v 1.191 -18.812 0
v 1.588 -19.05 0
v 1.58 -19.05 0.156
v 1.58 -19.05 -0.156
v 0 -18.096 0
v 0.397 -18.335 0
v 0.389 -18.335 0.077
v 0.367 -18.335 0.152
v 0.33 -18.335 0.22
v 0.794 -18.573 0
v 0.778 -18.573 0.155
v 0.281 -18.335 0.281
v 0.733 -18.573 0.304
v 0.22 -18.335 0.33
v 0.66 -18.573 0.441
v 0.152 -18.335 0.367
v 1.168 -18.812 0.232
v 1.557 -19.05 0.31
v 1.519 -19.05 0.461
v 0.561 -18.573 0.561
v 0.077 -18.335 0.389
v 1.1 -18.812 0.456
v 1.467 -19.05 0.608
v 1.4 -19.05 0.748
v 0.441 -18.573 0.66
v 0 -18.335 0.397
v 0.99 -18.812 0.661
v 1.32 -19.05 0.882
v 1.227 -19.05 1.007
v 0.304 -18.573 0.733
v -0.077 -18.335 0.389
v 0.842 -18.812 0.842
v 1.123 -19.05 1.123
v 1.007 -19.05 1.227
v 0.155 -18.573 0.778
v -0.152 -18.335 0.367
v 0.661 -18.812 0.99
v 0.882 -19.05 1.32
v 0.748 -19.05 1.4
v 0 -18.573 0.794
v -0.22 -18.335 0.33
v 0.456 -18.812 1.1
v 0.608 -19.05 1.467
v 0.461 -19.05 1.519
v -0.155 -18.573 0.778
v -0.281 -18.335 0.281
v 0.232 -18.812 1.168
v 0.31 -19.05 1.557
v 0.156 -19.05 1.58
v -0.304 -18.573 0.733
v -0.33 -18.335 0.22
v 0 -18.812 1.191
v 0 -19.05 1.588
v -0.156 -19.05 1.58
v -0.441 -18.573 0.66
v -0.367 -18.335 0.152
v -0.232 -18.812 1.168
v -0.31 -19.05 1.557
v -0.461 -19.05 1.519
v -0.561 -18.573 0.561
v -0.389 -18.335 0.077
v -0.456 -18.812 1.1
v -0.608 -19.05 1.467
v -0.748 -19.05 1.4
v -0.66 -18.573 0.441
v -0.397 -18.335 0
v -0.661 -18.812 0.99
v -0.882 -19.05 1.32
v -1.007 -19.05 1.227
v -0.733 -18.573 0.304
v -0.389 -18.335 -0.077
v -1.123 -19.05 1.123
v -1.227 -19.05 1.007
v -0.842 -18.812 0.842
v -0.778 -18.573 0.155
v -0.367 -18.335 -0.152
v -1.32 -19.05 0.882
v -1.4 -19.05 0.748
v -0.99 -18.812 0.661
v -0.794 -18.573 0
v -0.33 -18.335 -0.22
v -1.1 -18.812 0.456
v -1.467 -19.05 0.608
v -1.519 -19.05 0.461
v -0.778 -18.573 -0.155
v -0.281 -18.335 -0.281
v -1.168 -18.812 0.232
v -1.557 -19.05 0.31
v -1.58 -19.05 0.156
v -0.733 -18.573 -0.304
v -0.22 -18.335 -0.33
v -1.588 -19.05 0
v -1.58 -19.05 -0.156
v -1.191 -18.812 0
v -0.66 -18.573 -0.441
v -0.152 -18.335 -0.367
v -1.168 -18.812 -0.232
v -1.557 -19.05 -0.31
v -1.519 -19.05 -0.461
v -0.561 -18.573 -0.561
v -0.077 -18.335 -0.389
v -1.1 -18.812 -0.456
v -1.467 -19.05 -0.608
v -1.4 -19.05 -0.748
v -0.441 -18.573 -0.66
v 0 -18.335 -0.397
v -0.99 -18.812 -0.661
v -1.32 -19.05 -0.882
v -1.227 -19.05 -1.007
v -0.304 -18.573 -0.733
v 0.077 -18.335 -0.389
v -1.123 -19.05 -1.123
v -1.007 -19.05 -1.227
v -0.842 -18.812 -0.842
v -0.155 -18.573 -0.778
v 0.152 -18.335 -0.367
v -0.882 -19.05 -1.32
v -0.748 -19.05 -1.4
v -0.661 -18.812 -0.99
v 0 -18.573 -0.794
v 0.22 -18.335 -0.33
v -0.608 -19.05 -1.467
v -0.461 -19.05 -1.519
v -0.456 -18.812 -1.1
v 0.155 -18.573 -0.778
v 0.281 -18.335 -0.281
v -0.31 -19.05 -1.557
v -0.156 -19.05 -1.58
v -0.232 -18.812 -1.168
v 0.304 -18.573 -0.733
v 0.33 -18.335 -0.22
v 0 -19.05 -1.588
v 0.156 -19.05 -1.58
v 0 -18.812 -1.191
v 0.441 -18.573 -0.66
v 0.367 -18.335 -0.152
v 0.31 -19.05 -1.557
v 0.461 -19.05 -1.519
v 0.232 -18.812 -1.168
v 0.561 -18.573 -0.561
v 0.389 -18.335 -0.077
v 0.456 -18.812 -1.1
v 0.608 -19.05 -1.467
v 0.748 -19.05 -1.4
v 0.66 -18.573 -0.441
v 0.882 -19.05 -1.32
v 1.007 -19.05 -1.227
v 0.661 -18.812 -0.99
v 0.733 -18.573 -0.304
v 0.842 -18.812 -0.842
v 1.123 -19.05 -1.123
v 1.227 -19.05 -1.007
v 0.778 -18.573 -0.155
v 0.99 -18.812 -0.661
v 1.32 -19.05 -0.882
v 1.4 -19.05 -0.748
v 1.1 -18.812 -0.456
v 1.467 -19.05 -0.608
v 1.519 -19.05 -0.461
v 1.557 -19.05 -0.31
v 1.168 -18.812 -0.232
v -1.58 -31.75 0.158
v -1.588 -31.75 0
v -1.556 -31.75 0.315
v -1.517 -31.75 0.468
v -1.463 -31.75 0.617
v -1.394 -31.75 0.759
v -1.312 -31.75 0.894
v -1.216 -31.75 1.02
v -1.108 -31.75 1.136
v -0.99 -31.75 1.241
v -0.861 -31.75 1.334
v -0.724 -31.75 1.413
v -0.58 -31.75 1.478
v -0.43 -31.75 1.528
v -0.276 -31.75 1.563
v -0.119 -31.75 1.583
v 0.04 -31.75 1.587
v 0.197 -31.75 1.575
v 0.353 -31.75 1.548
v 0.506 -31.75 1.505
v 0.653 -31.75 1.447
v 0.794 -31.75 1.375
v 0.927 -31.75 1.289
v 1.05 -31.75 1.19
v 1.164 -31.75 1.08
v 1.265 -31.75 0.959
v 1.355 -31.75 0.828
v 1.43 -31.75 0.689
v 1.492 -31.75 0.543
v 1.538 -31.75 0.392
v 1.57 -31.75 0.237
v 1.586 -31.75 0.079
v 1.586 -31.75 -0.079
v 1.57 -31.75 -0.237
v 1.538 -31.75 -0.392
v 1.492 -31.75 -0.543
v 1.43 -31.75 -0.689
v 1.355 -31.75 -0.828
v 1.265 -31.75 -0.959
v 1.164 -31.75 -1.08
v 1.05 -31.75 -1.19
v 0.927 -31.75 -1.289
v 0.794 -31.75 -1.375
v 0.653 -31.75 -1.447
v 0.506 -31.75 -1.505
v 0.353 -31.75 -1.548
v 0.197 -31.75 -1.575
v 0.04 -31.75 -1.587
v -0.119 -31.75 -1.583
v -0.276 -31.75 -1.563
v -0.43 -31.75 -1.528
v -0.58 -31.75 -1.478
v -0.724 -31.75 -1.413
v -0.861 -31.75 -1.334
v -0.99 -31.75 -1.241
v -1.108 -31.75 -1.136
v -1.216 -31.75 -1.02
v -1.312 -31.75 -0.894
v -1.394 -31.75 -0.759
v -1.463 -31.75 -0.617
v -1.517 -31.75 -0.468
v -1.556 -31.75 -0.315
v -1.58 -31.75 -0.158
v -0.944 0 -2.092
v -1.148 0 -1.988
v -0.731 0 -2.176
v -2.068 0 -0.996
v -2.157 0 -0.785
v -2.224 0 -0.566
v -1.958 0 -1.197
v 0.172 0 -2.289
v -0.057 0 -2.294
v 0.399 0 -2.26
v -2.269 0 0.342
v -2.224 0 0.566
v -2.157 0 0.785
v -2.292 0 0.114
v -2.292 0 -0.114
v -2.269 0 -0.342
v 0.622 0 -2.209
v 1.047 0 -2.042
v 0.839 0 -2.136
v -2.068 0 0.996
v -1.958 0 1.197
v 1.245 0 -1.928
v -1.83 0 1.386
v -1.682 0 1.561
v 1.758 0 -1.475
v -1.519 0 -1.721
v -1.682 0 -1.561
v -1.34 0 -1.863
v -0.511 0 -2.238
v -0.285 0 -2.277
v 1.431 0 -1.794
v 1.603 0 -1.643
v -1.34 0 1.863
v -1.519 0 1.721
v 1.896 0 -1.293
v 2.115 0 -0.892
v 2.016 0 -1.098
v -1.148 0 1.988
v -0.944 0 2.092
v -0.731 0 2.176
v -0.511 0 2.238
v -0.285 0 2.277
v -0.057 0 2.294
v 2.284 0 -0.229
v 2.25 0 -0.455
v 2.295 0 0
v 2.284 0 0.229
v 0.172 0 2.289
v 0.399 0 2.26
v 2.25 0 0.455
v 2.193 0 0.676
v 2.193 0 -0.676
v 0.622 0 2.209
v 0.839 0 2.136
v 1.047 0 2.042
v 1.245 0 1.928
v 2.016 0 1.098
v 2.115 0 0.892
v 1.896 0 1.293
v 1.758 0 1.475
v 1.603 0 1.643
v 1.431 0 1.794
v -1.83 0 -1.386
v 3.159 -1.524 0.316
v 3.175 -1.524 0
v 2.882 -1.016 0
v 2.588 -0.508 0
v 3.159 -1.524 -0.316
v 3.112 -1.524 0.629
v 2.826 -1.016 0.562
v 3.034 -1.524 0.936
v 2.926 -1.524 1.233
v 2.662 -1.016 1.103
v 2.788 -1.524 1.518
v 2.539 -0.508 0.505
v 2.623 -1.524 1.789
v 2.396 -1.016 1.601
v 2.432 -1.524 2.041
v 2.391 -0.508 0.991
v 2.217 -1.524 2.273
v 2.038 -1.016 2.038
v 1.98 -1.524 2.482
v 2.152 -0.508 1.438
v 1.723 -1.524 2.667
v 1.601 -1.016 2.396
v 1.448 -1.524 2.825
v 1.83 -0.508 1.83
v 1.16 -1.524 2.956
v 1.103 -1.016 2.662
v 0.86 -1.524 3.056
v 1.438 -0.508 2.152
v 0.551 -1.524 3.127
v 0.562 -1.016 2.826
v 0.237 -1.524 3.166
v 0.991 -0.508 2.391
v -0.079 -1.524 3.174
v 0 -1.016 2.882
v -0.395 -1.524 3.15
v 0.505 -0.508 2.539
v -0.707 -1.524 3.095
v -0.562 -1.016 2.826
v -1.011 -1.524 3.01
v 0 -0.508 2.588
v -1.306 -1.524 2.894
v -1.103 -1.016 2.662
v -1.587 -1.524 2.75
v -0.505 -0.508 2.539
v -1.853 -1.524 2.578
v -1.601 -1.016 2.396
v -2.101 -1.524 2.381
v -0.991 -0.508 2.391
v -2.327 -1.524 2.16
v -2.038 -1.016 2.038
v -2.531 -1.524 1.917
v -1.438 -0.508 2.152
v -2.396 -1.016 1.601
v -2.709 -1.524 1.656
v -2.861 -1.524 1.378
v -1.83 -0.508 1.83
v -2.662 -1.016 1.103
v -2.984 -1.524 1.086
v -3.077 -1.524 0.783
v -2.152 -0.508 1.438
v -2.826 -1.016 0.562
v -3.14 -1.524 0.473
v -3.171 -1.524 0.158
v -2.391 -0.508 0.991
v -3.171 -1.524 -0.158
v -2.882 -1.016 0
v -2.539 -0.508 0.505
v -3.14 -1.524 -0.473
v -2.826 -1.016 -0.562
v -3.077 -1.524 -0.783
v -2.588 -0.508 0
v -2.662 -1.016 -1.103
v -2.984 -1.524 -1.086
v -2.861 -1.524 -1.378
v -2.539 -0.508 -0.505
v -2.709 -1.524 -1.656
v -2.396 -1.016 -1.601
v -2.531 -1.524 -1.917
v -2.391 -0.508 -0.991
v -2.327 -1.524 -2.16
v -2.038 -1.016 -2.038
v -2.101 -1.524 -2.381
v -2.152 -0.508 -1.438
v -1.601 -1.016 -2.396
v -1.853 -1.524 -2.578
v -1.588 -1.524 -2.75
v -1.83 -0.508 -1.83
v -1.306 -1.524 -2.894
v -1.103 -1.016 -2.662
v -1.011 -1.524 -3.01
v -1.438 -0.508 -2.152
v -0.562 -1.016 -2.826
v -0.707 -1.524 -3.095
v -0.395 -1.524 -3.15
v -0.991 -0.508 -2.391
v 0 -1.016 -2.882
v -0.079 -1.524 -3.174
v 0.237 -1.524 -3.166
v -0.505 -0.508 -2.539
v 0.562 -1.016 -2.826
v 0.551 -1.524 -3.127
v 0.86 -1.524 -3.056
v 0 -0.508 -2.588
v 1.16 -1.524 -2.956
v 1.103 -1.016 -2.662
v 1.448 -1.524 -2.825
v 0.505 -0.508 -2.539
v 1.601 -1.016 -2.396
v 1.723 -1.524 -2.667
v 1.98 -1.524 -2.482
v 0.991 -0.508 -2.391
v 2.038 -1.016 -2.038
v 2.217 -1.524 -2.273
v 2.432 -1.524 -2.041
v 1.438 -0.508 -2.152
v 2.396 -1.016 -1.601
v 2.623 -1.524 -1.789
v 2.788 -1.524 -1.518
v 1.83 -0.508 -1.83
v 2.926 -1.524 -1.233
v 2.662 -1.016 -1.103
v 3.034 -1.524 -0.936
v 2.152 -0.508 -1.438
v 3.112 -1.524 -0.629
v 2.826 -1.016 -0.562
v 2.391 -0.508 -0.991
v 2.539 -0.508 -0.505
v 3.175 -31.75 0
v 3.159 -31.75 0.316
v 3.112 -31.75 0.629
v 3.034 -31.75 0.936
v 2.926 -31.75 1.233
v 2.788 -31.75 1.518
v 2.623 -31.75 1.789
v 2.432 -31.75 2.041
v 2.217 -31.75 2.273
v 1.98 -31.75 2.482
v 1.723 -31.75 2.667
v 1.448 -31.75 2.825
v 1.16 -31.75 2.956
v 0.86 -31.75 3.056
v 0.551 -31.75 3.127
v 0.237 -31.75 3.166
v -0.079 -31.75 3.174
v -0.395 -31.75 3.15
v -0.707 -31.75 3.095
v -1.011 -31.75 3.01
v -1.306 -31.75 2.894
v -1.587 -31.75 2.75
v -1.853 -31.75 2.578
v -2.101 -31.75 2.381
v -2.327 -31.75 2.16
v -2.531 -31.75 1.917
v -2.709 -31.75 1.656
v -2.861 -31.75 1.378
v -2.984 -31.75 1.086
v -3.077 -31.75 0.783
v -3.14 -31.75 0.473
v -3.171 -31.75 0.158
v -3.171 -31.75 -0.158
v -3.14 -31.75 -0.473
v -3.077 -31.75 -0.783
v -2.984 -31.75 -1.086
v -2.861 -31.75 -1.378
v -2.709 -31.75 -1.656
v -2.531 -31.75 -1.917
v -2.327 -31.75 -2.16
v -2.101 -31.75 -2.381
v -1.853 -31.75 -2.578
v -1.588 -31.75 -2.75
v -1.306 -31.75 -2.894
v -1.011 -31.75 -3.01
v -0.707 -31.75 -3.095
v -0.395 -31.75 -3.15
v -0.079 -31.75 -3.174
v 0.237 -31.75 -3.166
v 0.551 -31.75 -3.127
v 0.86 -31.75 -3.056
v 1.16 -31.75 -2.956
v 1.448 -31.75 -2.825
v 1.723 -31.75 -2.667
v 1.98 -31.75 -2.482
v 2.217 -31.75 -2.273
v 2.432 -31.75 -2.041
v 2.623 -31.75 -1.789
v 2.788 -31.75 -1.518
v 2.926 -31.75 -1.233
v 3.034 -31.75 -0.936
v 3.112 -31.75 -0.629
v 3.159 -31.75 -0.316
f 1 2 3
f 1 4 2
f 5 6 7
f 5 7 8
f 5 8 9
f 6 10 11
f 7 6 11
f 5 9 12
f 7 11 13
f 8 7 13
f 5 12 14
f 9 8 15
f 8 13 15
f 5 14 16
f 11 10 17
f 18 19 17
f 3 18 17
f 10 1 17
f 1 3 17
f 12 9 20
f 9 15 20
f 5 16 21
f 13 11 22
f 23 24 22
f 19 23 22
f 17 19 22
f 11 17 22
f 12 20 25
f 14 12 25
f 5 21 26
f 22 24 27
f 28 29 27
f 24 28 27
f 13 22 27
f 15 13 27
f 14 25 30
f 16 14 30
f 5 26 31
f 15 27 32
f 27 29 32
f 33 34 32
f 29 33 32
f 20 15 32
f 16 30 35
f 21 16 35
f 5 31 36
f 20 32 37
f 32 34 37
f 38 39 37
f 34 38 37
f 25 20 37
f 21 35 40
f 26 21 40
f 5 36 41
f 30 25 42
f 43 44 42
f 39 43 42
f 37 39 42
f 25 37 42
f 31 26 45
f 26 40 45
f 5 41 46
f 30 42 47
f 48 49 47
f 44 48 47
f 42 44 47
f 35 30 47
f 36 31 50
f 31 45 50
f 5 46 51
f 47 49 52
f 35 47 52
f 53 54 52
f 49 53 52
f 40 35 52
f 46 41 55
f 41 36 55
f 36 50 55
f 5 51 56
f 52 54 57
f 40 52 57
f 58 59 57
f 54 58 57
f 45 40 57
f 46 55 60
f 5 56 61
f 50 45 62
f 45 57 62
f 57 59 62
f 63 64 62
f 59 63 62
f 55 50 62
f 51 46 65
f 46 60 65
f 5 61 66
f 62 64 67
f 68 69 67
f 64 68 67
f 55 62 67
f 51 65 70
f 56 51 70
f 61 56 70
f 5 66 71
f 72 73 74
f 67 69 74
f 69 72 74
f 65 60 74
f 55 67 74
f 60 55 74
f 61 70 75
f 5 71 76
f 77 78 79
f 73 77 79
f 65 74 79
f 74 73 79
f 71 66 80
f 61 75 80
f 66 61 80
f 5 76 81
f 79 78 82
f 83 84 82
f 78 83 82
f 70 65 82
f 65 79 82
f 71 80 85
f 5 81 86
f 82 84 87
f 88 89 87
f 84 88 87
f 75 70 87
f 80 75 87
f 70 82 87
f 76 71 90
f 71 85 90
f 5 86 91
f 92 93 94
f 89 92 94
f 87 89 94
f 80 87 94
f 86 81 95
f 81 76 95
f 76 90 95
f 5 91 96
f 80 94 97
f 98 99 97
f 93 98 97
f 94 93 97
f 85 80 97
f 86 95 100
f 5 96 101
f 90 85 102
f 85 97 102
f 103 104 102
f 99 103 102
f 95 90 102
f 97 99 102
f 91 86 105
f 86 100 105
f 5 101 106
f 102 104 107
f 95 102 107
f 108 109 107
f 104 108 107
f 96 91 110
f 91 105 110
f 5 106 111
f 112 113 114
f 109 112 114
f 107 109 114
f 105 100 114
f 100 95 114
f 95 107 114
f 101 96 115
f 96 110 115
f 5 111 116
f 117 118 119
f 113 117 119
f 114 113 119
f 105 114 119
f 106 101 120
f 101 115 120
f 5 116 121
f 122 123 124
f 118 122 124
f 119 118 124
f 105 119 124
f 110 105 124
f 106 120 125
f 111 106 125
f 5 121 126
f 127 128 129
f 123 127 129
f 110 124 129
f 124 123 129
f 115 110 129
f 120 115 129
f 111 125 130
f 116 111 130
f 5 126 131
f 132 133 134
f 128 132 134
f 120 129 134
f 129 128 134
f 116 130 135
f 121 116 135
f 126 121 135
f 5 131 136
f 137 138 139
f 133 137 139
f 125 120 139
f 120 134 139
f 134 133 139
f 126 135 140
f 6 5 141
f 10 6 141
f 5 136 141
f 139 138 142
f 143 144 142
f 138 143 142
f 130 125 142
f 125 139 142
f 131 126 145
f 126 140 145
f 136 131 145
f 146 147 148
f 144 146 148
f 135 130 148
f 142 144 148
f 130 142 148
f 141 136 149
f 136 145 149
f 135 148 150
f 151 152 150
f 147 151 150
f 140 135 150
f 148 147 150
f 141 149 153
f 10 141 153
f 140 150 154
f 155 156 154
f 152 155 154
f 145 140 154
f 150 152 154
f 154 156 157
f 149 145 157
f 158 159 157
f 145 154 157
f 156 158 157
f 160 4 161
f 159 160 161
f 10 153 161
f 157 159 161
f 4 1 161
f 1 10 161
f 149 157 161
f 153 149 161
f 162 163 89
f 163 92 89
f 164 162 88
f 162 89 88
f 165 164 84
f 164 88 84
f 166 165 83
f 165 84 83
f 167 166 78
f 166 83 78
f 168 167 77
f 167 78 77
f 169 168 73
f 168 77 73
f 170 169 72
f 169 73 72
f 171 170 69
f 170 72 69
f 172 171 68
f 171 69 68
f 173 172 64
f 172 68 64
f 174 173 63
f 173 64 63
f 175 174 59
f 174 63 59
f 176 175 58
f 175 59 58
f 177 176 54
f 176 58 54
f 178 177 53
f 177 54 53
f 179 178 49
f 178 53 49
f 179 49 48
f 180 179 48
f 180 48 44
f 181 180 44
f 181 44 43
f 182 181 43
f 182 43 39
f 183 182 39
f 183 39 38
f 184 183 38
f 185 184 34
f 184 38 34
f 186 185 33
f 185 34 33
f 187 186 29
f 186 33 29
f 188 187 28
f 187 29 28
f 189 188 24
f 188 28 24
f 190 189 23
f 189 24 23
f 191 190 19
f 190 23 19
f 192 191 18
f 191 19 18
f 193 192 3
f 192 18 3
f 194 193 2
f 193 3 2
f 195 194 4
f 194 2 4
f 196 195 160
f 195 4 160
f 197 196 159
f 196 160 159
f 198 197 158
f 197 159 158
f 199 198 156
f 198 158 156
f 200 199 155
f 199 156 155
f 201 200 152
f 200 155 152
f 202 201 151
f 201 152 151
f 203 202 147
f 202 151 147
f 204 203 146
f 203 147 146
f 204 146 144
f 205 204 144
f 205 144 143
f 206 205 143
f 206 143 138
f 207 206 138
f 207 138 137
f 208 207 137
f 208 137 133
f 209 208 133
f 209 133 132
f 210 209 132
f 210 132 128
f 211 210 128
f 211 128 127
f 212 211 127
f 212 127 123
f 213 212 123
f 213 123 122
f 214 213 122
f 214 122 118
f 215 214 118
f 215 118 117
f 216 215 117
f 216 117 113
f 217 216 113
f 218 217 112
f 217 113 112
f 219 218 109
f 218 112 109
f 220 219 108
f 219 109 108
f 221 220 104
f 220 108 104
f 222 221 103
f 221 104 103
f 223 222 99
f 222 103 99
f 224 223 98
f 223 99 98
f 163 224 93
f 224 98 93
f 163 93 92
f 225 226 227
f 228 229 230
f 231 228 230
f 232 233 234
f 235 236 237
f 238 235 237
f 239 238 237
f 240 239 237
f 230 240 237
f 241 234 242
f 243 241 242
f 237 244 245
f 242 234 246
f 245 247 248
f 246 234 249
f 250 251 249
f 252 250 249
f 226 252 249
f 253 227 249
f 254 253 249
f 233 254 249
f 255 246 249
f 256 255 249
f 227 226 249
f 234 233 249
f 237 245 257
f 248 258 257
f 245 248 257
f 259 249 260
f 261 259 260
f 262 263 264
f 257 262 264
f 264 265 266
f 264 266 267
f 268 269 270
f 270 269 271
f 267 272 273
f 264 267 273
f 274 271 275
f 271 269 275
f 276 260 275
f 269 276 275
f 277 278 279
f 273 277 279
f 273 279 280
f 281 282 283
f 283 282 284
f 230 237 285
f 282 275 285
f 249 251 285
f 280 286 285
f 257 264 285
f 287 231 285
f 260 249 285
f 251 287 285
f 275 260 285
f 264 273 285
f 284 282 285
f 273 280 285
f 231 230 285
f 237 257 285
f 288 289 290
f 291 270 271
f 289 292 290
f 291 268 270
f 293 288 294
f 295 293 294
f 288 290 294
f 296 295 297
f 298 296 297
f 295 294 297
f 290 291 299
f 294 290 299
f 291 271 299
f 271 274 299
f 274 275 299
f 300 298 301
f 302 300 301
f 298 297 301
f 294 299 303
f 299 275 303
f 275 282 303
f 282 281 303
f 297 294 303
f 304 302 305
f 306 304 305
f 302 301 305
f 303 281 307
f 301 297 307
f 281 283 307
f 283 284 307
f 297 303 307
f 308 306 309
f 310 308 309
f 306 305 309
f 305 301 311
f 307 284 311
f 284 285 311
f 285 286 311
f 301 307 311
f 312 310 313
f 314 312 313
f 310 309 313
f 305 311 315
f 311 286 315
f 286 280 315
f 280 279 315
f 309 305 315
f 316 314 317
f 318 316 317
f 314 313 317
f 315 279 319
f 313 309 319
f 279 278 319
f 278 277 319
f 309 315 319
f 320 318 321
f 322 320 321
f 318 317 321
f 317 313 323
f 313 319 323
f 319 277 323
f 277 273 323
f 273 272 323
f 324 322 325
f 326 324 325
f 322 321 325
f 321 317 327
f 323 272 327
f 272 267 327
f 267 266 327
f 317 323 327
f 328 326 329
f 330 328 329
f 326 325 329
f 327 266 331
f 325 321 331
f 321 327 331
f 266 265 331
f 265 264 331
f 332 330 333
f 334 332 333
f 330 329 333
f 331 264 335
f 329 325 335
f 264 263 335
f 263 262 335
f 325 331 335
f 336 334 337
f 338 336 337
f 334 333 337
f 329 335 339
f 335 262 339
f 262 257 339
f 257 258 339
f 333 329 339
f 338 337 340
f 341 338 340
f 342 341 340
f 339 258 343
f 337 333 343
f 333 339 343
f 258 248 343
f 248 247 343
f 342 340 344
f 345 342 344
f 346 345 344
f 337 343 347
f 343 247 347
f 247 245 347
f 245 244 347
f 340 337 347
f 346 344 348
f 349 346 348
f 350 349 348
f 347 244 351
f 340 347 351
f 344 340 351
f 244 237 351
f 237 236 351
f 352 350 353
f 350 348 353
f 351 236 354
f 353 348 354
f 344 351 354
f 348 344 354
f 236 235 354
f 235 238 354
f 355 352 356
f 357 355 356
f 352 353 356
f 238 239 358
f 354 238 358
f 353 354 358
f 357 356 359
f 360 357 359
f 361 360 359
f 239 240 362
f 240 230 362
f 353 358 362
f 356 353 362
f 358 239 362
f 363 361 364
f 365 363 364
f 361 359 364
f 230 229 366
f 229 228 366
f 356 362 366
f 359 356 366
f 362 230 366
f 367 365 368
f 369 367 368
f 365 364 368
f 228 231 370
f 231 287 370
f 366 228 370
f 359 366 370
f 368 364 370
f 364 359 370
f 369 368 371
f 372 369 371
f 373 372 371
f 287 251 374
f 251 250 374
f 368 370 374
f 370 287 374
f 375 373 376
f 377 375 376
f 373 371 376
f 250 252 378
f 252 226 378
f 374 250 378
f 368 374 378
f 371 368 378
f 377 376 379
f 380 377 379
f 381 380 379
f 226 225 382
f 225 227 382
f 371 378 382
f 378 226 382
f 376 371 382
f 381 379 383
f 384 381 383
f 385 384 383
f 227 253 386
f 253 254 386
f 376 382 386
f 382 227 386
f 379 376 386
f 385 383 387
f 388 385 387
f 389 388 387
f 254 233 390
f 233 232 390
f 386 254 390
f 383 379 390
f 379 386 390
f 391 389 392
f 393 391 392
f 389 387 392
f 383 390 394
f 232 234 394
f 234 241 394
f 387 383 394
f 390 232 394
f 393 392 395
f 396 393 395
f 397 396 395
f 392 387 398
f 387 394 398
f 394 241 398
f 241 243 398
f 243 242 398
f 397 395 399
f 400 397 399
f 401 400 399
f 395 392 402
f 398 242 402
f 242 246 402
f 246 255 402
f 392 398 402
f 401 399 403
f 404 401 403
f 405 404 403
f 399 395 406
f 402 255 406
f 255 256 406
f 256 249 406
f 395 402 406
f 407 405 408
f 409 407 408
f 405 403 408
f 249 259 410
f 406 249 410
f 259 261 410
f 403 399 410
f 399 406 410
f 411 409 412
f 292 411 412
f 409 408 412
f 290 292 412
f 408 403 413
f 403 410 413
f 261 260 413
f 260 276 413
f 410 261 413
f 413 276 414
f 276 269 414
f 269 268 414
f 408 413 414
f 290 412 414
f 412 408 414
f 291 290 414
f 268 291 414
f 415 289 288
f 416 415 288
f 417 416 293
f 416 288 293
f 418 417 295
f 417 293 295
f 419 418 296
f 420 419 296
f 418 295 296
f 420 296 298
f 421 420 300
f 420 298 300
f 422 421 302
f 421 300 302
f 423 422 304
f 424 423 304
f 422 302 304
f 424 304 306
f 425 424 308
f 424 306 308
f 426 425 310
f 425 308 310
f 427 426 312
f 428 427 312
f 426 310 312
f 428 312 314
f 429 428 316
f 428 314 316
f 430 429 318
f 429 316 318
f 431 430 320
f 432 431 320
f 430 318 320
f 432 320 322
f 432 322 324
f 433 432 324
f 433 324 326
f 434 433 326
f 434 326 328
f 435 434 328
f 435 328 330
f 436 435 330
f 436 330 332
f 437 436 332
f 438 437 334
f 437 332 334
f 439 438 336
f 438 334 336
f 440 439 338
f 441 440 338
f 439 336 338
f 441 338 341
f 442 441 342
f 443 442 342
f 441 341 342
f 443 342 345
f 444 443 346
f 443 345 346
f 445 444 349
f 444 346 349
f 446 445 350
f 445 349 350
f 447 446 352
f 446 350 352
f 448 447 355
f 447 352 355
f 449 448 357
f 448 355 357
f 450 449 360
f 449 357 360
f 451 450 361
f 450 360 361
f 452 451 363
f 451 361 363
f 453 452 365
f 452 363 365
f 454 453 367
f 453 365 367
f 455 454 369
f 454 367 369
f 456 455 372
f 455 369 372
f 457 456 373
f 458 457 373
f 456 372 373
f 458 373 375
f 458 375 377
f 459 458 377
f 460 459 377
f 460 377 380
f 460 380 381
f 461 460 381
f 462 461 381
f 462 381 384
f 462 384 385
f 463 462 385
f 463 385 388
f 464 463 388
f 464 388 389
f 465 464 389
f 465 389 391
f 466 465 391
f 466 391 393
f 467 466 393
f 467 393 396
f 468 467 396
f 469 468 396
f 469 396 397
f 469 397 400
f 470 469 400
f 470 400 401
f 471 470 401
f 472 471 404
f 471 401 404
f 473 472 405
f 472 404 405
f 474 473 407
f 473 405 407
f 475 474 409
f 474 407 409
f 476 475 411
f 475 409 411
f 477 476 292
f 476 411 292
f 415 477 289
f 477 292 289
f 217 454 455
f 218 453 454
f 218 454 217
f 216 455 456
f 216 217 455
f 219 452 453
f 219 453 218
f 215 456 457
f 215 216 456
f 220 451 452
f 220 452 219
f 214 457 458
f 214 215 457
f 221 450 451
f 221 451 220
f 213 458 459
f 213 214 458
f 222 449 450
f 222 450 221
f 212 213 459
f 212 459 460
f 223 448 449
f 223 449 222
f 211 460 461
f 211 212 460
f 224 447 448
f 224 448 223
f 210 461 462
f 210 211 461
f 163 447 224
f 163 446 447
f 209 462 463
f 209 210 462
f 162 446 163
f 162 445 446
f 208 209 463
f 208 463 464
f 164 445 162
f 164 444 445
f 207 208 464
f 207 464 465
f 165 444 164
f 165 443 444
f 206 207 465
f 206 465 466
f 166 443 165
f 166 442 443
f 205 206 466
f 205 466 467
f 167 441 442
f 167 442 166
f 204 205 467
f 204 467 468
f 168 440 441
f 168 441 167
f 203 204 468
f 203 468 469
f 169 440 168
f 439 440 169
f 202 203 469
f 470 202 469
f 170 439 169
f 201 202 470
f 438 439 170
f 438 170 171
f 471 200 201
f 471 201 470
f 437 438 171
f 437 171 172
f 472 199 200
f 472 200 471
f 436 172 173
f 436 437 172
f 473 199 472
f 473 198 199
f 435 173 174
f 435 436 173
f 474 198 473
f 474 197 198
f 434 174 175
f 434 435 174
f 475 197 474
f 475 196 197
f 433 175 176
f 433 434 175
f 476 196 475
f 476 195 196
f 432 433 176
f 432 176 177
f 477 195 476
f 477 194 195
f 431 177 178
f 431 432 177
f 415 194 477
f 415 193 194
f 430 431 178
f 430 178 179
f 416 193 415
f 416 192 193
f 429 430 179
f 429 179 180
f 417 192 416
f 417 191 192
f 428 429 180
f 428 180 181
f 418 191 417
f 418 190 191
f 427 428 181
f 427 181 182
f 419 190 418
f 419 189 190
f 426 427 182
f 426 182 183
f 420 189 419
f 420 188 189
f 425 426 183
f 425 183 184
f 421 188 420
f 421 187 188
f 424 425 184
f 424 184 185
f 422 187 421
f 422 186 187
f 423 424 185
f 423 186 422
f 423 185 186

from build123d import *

# Parameters (mm, degrees)
F0_R     = 3.175
F1_DEPTH = 31.75
F3_D     = 3.175
F3_DEPTH = 12.7
F3_TIP   = 0.9538662327
F4_SIZE2 = 0.8798818102
F4_SIZE  = 1.524


with BuildPart() as f1:
    # F0 (on Front) → F1 (new body)
    with BuildSketch(Plane.XZ):
        Circle(F0_R)
    extrude(amount=F1_DEPTH)

    # F3
    with Locations(Plane.XZ.offset(31.75)):
        with Locations((0, 0)):
            Hole(F3_D / 2, depth=F3_DEPTH)
            with Locations((0, 0, -(F3_DEPTH + F3_TIP / 2))):  # 118° drill point
                Cone(0, F3_D / 2, F3_TIP, mode=Mode.SUBTRACT)

    # F4
    f4_edges = [f1.edges().sort_by_distance(p)[0] for p in [
        (-3.175, 0, 0),
    ]]
    f4_side = f1.faces().sort_by_distance((-3.175, -15.875, 0))[0]
    chamfer(f4_edges, length=F4_SIZE, length2=F4_SIZE2, reference=f4_side)


solid = f1.part
